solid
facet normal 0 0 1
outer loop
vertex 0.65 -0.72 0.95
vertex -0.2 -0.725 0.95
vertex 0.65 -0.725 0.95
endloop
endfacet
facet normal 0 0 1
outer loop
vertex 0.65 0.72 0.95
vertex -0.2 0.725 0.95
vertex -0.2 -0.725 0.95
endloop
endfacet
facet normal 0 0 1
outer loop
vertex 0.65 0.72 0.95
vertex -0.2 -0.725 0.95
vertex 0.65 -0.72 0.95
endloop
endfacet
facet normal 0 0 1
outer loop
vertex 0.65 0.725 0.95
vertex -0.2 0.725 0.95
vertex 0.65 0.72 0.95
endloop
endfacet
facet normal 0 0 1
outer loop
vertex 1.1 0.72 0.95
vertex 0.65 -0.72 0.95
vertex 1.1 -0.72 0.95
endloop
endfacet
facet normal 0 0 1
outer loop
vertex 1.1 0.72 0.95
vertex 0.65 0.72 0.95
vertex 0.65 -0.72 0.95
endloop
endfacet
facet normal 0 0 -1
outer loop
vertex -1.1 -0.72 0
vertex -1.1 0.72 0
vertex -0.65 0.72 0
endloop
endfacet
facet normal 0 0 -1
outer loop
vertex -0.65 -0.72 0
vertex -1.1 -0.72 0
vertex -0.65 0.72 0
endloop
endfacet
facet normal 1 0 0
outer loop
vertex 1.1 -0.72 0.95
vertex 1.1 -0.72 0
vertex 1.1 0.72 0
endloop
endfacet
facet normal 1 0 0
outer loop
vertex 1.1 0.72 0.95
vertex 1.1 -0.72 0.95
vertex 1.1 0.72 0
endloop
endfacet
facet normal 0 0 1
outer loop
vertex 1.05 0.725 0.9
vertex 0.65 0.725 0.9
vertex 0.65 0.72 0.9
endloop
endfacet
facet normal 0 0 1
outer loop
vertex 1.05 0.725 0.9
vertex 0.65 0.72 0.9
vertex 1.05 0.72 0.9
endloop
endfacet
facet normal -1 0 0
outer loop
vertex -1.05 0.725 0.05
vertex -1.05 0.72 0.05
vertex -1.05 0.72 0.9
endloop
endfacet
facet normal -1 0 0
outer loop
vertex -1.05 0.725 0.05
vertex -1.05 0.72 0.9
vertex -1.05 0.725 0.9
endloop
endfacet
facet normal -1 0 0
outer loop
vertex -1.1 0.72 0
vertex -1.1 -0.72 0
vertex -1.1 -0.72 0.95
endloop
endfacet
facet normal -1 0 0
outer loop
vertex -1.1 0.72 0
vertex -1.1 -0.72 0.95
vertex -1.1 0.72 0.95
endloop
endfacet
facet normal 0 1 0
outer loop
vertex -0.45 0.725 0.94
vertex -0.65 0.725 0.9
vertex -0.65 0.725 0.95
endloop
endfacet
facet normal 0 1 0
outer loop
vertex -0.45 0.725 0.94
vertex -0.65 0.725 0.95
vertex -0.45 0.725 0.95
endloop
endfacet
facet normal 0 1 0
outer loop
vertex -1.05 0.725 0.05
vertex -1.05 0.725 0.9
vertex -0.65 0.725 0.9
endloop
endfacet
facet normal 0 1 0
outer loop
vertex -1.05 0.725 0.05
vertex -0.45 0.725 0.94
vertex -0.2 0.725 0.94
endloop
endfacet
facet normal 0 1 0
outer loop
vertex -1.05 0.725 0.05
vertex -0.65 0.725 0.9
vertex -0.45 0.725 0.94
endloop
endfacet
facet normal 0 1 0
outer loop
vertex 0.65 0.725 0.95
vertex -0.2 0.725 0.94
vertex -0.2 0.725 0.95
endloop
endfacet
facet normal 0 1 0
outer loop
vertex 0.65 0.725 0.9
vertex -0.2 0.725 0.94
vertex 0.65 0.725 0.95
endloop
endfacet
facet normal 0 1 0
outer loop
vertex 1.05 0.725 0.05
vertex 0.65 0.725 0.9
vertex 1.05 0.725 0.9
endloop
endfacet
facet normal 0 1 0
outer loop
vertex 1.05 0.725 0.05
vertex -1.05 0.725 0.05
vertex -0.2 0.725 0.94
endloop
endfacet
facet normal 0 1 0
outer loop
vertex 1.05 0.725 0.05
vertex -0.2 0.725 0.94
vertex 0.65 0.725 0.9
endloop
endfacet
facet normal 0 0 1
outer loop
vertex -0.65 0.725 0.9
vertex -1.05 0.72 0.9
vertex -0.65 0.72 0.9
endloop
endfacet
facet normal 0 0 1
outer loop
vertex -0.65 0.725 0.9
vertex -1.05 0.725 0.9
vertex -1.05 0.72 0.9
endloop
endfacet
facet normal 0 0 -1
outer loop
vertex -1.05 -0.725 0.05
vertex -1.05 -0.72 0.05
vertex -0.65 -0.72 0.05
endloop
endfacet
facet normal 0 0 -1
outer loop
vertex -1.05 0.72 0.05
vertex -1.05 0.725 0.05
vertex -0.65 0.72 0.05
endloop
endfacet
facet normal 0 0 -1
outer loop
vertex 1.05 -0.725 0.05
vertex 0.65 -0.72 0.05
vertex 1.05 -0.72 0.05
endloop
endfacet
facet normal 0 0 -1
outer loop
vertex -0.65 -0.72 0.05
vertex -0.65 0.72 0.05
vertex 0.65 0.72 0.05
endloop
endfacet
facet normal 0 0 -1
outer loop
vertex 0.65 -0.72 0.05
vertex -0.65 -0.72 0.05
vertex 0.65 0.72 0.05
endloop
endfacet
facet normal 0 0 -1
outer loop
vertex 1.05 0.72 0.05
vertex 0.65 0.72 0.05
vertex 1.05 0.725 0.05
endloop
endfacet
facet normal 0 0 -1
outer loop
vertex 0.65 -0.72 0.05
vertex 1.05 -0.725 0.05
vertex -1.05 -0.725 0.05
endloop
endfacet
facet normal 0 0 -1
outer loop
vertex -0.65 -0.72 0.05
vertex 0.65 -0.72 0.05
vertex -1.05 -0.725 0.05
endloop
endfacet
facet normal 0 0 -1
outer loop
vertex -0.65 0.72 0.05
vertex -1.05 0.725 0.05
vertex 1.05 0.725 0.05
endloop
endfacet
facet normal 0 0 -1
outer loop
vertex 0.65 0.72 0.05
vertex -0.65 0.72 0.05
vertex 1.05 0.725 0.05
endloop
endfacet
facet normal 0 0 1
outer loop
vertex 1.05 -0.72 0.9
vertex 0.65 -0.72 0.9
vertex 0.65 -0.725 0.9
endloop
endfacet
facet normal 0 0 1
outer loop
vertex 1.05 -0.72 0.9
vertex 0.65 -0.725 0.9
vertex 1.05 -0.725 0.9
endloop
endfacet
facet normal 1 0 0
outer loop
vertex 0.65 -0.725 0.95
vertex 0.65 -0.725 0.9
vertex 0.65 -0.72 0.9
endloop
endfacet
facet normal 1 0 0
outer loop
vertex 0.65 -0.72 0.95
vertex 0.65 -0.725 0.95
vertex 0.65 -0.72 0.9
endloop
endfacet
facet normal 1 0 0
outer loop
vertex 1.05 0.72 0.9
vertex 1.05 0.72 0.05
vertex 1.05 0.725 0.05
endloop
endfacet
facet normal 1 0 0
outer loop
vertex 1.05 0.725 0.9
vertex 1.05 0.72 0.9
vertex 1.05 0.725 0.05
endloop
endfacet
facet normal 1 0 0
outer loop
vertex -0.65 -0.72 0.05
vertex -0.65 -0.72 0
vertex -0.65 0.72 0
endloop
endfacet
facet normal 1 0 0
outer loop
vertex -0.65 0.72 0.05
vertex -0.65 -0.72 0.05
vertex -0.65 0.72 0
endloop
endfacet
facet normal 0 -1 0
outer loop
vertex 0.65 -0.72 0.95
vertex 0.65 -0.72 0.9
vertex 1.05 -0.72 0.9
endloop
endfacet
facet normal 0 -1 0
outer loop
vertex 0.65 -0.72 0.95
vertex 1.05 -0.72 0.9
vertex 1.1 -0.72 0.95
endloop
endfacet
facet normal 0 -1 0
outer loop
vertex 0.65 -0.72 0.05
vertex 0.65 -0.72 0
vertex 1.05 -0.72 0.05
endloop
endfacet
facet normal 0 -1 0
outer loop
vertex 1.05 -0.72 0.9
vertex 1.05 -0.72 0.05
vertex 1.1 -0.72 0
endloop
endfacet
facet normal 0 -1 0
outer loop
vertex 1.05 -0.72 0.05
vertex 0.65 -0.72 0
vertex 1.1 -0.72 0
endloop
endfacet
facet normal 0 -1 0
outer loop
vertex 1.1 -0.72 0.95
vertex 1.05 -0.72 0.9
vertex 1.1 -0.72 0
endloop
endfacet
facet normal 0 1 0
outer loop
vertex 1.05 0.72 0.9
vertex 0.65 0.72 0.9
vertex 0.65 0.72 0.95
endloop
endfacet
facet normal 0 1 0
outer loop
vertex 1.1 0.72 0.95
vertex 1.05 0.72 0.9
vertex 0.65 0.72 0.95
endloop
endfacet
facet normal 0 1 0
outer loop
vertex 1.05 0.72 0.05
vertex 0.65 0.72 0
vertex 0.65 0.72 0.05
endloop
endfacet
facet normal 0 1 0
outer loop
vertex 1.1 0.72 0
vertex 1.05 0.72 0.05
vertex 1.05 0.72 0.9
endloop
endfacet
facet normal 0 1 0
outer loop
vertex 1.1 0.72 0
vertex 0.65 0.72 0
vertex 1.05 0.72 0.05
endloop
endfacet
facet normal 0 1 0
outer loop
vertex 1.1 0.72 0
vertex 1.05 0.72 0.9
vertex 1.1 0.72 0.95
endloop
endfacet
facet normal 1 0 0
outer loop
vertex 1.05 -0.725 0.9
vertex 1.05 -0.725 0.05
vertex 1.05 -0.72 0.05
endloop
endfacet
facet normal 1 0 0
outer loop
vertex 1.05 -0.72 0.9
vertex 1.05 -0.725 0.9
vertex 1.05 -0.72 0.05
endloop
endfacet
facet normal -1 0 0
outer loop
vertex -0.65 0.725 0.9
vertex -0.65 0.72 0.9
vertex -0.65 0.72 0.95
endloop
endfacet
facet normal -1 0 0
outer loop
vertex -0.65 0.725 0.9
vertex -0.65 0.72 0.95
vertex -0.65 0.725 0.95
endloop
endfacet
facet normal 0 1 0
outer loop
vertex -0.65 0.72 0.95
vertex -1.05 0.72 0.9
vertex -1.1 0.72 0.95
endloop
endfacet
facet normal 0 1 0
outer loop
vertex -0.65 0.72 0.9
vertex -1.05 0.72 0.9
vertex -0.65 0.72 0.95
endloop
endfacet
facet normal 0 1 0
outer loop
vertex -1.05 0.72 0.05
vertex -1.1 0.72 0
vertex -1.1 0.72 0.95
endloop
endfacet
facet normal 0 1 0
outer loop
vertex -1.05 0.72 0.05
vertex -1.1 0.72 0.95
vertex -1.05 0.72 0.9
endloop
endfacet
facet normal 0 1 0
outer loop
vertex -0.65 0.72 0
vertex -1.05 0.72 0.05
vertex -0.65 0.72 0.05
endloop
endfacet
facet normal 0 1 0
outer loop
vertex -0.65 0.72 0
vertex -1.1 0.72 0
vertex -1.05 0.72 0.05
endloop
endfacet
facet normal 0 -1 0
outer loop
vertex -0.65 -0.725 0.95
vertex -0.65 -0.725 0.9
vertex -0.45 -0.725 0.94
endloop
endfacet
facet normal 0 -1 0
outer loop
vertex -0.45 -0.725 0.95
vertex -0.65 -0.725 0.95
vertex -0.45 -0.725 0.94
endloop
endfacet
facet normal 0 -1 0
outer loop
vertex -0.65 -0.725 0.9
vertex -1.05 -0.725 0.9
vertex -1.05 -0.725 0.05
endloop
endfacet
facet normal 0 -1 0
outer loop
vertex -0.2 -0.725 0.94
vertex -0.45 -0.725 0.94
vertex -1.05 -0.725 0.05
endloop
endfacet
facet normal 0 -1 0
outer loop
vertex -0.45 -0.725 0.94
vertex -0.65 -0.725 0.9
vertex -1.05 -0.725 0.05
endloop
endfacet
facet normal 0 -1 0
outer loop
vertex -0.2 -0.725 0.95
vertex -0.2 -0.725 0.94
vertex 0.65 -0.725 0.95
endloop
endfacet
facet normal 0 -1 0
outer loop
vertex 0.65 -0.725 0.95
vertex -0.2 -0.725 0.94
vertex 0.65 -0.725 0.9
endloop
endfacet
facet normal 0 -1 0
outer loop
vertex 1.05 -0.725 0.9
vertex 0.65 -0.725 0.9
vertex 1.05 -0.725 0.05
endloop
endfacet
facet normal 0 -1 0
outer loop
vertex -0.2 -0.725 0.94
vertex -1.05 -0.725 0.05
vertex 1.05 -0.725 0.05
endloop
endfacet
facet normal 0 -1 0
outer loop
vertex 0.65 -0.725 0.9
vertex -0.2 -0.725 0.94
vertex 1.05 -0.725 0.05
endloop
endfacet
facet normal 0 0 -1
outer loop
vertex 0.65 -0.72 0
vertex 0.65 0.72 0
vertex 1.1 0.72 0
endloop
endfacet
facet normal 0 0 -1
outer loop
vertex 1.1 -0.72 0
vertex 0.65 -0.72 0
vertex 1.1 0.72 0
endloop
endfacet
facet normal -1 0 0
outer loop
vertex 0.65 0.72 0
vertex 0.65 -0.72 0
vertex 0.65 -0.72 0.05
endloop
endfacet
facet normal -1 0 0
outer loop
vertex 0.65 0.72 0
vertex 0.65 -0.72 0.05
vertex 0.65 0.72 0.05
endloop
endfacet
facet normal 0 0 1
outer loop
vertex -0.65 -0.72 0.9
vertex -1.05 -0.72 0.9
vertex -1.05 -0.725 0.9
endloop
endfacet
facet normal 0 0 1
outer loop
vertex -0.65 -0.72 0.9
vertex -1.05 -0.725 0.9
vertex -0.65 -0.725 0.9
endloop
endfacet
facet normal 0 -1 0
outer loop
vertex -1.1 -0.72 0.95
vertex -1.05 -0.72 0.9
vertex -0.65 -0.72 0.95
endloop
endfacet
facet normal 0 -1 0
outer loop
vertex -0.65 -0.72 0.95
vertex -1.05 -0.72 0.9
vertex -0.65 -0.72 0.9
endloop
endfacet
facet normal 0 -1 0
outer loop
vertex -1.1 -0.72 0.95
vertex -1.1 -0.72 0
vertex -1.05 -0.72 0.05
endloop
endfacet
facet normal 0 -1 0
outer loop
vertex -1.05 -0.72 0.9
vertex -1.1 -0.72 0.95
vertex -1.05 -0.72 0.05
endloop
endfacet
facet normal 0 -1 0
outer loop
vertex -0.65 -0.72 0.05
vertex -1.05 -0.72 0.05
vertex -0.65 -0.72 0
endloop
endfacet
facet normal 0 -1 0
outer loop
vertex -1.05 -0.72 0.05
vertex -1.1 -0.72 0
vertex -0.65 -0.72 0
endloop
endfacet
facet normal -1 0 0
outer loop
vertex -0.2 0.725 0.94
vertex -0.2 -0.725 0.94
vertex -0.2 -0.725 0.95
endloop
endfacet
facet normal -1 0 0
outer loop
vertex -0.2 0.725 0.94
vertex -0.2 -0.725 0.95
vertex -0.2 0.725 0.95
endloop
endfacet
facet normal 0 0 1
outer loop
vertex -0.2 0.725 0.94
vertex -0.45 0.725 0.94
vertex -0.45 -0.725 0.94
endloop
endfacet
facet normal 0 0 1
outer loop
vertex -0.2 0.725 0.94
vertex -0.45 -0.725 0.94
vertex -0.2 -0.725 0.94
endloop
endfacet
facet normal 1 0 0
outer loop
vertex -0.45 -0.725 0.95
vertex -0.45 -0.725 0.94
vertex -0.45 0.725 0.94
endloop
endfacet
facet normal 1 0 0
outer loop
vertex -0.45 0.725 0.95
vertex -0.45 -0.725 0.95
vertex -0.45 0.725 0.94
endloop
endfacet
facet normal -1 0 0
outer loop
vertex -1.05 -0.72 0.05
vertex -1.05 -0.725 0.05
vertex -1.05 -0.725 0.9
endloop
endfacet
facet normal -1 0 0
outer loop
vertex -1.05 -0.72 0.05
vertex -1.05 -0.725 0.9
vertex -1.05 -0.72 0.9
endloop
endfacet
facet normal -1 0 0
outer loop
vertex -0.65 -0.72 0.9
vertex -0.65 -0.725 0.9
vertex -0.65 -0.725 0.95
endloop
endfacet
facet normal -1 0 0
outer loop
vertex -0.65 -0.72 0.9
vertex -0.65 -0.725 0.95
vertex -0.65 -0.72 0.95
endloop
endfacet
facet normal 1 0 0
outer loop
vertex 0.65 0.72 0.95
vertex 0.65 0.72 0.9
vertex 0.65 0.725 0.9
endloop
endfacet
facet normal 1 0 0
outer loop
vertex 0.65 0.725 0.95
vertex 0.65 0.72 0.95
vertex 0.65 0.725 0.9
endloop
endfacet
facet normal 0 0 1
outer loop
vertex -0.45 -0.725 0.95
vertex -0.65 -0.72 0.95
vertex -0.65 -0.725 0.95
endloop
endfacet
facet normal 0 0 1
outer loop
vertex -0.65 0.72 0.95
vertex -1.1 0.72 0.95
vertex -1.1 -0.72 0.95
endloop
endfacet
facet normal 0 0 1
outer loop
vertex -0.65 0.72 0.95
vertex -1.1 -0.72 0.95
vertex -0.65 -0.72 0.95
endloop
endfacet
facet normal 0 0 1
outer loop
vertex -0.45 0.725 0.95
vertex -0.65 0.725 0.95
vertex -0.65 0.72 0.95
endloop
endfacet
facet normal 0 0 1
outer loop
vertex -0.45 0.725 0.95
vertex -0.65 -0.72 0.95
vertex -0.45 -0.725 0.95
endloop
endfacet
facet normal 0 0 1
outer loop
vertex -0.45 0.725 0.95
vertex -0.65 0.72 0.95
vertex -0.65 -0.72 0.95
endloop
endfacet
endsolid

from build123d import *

# Parameters (mm, degrees)
PLATING_LEFT_W      = 0.45
PLATING_LEFT_H      = 1.44
PLATING_LEFT_DEPTH  = 0.95
PLATING_RIGHT_W     = 0.45
PLATING_RIGHT_H     = 1.44
PLATING_RIGHT_DEPTH = 0.95
BOX_W               = 0.25
BOX_H               = 3
BOX_DEPTH           = 3
MARKING_W           = 1.3
MARKING_H           = 1.45
MARKING_DEPTH       = 0.05
CHIP_W              = 2.1
CHIP_H              = 1.45
CHIP_DEPTH          = 0.85


with BuildPart() as plating_left:
    # plating_left → plating_left (new body)
    with BuildSketch(Plane(origin=(-1.1, -0.72, 0), x_dir=(1, 0, 0), z_dir=(0, 0, 1))):
        with Locations((0.225, 0.72)):
            Rectangle(PLATING_LEFT_W, PLATING_LEFT_H)
    extrude(amount=PLATING_LEFT_DEPTH)


with BuildPart() as plating_right:
    # plating_right → plating_right (new body)
    with BuildSketch(Plane(origin=(0.65, -0.72, 0), x_dir=(1, 0, 0), z_dir=(0, 0, 1))):
        with Locations((0.225, 0.72)):
            Rectangle(PLATING_RIGHT_W, PLATING_RIGHT_H)
    extrude(amount=PLATING_RIGHT_DEPTH)


with BuildPart() as box:
    # Box → Box (new body)
    with BuildSketch(Plane(origin=(-0.45, -2, 0.94), x_dir=(1, 0, 0), z_dir=(0, 0, 1))):
        with Locations((0.125, 1.5)):
            Rectangle(BOX_W, BOX_H)
    extrude(amount=BOX_DEPTH)


with BuildPart() as cut:
    # marking → marking (new body)
    with BuildSketch(Plane(origin=(-0.65, -0.725, 0.9), x_dir=(1, 0, 0), z_dir=(0, 0, 1))):
        with Locations((0.65, 0.725)):
            Rectangle(MARKING_W, MARKING_H)
    extrude(amount=MARKING_DEPTH)

    # Cut: cut Box
    add(box.part, mode=Mode.SUBTRACT)


with BuildPart() as dio_chip:
    # chip → chip (new body)
    with BuildSketch(Plane(origin=(-1.05, -0.725, 0.05), x_dir=(1, 0, 0), z_dir=(0, 0, 1))):
        with Locations((1.05, 0.725)):
            Rectangle(CHIP_W, CHIP_H)
    extrude(amount=CHIP_DEPTH)

    # Fusion: union plating_left, plating_right, Cut
    add(plating_left.part)
    add(plating_right.part)
    add(cut.part)


solid = dio_chip.part
